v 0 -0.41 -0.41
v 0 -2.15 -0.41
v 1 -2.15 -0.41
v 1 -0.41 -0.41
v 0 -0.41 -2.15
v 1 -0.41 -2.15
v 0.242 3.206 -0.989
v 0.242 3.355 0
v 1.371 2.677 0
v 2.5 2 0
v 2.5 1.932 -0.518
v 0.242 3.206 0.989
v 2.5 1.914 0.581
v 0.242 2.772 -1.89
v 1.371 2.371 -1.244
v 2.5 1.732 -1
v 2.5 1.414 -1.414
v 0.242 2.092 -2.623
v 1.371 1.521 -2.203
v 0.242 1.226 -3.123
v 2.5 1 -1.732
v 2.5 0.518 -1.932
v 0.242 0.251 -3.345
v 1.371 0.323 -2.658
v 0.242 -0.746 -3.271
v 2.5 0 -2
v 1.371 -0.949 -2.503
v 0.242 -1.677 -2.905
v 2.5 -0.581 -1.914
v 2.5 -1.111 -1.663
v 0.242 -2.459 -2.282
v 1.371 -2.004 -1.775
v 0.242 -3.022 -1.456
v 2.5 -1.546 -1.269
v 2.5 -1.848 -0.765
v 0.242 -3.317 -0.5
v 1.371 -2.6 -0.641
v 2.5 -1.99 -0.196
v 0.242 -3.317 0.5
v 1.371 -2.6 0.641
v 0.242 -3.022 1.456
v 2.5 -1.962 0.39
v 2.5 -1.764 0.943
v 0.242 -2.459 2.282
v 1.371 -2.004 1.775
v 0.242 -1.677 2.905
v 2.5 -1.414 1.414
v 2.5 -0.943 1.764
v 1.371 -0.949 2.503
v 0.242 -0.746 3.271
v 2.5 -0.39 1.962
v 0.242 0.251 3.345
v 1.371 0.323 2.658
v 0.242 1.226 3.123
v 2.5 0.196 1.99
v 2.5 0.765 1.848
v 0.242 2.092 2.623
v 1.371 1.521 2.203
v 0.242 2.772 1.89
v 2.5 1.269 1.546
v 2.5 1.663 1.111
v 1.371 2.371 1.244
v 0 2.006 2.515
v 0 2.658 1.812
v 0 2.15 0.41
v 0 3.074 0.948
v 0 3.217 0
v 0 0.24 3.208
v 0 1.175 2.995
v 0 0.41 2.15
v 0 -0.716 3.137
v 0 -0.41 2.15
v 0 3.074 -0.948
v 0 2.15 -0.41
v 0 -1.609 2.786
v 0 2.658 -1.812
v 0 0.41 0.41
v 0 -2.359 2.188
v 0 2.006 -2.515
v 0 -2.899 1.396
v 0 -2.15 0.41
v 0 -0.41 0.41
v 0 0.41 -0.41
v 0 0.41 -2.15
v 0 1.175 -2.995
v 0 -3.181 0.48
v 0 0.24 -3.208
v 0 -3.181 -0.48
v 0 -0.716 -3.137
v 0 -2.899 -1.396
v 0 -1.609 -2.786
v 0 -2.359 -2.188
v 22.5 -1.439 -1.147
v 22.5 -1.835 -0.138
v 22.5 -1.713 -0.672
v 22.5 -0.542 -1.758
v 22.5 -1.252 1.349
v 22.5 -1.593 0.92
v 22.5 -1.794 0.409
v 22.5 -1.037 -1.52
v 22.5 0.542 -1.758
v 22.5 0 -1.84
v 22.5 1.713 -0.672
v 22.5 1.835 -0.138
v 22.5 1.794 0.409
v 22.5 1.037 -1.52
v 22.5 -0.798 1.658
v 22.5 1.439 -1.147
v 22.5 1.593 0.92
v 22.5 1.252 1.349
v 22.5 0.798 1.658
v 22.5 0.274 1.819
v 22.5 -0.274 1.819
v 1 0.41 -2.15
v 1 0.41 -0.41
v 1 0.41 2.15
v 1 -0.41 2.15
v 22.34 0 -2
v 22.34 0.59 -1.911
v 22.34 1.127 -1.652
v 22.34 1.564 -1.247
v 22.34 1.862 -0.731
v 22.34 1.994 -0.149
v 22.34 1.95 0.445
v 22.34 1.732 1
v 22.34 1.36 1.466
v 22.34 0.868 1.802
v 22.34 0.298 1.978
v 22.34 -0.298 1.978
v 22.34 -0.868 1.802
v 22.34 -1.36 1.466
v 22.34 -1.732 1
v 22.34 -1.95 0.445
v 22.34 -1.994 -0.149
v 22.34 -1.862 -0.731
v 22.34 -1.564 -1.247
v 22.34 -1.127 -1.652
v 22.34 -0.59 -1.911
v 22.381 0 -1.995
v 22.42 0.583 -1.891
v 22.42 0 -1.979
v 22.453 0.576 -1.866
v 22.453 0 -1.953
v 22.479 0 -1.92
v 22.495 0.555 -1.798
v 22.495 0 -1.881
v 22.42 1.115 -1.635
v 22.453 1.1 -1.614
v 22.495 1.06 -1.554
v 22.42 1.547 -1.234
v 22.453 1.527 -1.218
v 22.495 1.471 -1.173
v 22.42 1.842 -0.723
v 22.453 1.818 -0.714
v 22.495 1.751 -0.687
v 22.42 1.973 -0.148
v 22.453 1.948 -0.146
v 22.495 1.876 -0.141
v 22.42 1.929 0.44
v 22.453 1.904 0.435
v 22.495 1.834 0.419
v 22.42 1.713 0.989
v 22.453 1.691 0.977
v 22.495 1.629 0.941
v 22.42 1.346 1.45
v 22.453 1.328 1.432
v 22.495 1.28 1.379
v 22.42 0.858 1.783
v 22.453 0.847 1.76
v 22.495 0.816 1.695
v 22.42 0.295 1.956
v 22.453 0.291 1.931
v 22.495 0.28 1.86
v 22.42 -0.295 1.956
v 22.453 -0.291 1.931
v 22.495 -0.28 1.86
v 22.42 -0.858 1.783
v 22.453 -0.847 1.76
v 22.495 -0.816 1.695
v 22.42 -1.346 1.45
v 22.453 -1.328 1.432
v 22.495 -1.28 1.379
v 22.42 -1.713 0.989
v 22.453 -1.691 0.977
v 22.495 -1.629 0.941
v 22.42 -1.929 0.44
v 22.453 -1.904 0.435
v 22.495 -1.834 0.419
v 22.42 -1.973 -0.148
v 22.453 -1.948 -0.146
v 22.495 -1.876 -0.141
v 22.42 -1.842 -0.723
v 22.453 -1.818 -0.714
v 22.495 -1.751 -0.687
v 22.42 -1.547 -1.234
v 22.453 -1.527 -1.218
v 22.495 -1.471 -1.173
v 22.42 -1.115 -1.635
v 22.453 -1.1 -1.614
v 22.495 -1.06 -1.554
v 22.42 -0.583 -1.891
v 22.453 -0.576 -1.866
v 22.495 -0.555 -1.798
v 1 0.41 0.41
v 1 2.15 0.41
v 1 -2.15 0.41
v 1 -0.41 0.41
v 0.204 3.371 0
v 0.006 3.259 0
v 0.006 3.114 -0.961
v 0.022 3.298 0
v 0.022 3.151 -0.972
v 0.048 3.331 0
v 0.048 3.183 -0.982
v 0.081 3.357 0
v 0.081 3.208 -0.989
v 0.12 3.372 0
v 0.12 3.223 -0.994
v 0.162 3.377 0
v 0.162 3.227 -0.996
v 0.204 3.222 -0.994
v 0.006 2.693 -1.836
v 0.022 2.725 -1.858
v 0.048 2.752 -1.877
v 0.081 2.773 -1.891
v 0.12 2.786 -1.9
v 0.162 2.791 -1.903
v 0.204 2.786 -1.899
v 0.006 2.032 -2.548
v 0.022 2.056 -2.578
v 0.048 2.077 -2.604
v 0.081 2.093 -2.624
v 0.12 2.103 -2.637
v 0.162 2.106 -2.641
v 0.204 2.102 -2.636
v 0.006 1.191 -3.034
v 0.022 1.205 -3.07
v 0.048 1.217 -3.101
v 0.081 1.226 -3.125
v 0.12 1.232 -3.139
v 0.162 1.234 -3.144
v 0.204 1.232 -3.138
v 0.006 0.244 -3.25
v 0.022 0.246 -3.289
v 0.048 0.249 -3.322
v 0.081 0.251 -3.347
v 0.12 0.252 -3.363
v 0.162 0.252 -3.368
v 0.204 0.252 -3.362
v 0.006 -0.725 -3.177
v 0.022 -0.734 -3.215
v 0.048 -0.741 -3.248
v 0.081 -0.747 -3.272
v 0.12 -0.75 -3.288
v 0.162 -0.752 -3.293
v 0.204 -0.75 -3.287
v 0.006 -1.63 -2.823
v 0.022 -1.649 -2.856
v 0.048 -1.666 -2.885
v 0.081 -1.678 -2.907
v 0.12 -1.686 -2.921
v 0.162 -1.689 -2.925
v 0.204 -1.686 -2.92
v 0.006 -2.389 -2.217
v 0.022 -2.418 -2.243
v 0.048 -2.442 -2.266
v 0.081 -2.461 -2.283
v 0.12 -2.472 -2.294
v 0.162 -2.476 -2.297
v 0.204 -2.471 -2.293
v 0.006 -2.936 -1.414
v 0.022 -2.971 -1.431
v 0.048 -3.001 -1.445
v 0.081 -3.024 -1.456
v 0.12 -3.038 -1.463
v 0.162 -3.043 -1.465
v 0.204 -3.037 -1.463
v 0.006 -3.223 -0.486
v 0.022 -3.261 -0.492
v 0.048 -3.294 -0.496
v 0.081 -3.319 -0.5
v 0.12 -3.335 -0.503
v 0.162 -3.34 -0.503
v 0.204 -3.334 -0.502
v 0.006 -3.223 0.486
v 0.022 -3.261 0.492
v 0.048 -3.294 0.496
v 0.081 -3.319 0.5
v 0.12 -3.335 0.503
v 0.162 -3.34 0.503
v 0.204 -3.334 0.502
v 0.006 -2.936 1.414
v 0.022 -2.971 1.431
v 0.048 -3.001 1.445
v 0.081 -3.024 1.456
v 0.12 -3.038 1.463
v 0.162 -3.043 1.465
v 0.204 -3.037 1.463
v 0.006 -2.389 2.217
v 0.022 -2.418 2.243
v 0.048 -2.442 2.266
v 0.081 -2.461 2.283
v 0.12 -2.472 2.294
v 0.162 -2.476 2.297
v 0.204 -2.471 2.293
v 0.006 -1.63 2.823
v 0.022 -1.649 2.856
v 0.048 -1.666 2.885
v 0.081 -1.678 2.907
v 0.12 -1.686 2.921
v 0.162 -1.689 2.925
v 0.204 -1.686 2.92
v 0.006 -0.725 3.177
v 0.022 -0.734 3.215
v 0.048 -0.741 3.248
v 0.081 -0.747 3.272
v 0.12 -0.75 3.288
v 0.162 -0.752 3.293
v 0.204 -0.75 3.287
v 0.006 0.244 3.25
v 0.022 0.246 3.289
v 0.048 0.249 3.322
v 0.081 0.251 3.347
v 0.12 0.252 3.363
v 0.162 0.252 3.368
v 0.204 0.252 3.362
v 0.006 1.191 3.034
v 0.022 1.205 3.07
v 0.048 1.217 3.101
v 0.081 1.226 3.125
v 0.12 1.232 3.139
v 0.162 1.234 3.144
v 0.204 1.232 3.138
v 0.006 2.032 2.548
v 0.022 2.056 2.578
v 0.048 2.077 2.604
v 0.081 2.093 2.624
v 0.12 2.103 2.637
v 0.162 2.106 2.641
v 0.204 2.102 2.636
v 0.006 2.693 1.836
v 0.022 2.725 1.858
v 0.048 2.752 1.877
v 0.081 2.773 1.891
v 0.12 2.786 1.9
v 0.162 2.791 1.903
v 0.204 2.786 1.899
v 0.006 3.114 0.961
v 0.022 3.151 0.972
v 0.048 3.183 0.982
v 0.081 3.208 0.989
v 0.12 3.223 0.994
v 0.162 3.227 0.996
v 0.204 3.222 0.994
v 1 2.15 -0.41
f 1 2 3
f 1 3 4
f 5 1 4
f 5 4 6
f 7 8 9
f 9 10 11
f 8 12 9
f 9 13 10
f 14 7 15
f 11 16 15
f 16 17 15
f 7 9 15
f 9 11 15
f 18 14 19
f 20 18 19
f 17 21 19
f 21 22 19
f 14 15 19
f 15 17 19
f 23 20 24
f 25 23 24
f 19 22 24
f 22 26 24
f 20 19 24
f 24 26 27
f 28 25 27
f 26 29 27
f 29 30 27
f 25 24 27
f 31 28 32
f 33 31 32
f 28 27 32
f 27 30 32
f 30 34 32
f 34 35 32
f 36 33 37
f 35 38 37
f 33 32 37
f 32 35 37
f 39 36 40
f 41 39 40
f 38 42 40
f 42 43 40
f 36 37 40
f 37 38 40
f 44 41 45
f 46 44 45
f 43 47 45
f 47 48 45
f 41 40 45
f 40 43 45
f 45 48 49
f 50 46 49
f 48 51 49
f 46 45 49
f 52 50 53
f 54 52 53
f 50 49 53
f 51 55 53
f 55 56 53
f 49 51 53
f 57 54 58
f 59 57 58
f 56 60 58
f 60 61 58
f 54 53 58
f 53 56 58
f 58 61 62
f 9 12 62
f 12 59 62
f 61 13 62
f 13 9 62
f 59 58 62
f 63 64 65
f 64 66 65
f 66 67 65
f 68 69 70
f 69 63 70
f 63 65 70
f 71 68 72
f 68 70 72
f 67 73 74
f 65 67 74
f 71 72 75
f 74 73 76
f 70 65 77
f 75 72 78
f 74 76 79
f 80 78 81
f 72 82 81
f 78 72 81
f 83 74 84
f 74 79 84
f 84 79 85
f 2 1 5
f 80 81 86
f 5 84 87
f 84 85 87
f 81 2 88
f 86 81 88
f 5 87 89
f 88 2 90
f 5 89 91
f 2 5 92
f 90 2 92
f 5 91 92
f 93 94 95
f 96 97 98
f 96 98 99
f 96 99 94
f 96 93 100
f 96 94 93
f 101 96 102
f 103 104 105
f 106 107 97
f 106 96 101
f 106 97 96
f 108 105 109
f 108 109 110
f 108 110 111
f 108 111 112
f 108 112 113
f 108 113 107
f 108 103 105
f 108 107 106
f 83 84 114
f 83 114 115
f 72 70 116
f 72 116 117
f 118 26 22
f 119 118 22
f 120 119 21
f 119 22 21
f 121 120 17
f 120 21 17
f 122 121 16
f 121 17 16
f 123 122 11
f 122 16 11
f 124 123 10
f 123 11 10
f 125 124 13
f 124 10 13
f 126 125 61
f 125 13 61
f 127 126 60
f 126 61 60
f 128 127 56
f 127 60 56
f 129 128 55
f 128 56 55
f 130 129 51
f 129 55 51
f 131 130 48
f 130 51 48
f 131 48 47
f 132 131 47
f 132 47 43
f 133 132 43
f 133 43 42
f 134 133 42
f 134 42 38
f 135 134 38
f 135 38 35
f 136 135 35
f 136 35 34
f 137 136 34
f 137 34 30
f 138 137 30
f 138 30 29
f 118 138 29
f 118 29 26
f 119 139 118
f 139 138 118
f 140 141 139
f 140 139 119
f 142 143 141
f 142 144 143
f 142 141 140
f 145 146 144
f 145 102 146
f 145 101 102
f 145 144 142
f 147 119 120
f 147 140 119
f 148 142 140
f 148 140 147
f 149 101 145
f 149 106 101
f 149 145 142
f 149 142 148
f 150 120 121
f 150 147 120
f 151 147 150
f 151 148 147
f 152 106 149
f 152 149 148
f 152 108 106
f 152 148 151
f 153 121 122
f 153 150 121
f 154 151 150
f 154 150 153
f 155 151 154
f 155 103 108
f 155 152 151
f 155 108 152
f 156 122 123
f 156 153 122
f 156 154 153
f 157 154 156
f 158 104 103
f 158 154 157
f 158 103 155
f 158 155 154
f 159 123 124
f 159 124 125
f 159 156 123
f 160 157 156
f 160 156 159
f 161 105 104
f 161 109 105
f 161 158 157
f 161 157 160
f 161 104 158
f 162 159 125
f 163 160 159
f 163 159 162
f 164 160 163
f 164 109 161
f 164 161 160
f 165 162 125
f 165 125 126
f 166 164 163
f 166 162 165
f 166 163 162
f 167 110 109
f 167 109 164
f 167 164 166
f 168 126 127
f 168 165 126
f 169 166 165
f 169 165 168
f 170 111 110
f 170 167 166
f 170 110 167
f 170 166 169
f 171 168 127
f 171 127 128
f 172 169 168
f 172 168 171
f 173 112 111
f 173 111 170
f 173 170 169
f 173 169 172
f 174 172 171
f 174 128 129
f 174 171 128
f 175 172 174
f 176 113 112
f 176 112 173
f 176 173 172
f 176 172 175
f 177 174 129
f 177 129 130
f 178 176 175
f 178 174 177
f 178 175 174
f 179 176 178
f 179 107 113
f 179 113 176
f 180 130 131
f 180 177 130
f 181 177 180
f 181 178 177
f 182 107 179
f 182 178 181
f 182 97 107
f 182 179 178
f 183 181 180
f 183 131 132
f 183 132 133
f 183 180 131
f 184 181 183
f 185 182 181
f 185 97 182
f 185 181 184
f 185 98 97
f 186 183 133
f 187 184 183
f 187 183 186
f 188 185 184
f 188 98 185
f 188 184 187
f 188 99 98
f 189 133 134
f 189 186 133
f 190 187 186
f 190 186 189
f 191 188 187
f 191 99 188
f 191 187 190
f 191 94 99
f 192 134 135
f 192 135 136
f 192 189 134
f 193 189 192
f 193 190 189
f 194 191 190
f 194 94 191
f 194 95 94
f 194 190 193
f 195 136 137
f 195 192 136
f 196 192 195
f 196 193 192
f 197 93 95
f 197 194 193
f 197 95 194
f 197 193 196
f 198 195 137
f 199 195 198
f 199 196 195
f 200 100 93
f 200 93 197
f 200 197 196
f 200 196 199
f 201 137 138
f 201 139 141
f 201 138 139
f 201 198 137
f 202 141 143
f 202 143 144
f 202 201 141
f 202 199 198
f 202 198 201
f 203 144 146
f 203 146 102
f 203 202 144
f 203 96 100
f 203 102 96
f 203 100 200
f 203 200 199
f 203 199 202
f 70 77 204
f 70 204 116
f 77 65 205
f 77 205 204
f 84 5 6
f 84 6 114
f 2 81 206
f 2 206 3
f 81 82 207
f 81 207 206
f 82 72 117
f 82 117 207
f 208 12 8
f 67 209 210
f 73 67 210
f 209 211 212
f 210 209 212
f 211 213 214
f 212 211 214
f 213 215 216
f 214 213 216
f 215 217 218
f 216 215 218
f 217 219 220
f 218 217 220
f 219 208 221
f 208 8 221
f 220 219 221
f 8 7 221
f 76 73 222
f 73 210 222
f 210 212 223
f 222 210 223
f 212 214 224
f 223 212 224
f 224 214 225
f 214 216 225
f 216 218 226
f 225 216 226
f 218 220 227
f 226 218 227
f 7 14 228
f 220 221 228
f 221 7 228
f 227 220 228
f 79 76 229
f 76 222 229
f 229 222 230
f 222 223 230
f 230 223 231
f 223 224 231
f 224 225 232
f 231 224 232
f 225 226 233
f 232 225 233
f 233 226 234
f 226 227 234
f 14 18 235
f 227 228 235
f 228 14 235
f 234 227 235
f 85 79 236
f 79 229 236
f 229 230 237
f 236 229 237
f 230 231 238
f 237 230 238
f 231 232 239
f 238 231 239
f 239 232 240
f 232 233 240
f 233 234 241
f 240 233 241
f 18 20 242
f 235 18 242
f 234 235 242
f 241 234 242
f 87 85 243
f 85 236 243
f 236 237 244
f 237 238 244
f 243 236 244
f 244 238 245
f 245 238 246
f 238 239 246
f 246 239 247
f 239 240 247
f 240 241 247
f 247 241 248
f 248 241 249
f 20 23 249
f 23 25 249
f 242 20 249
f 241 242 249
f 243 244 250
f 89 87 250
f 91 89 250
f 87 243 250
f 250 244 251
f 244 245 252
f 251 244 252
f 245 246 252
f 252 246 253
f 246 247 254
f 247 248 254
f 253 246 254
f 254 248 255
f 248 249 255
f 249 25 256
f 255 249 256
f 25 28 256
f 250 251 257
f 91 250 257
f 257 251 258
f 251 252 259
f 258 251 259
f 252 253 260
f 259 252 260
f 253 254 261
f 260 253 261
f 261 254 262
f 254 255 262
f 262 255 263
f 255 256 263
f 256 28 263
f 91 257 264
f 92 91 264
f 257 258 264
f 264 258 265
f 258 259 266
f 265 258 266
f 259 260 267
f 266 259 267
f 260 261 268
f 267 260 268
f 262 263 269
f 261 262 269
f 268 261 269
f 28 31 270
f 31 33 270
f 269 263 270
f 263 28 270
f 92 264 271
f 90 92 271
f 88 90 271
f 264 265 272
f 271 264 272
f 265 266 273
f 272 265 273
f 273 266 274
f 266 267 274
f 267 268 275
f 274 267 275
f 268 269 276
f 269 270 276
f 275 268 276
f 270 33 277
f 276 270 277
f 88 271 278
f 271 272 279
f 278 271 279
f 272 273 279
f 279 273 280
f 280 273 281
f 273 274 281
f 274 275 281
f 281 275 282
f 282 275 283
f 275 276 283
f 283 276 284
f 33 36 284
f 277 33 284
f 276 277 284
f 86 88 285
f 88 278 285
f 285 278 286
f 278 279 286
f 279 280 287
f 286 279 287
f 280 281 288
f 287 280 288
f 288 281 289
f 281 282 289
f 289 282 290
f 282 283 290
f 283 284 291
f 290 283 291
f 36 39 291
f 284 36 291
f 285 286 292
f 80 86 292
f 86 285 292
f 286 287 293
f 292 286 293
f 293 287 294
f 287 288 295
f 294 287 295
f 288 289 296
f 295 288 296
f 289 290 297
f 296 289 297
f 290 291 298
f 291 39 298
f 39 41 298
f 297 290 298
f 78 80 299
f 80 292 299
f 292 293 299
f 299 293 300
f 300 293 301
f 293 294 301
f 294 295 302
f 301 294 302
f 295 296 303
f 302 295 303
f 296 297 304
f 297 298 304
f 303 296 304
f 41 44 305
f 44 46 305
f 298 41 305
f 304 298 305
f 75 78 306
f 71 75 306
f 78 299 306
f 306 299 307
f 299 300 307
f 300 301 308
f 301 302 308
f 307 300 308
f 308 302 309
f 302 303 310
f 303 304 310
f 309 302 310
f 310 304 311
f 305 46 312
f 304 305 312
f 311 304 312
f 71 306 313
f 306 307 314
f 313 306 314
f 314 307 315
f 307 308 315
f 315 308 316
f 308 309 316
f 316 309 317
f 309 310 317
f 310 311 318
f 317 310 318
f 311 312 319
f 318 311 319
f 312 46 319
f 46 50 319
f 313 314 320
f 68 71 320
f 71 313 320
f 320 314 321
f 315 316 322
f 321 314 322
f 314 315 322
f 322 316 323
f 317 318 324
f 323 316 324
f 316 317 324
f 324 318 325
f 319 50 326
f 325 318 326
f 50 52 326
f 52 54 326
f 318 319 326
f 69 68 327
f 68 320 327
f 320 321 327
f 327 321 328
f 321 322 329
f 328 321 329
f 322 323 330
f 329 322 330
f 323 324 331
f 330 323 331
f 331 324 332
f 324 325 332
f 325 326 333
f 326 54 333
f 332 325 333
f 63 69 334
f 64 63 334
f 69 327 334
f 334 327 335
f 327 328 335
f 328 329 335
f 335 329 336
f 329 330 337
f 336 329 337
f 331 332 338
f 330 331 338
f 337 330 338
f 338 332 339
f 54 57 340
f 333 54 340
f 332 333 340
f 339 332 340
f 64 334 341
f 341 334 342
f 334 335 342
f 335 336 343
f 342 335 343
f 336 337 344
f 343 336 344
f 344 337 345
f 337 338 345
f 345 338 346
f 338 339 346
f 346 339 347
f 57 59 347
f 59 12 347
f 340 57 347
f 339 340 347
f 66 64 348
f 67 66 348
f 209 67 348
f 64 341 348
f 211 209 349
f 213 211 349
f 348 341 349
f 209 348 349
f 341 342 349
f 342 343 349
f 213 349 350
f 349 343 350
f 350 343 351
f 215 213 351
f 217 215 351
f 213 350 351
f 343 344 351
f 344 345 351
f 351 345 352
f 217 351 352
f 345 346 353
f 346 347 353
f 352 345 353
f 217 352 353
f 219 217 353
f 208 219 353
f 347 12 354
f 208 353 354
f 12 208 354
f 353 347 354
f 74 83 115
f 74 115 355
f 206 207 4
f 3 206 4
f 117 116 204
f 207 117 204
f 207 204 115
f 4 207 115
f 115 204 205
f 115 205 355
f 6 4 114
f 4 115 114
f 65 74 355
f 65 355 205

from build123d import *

# Parameters (mm, degrees)
FILLET_1_R          = 0.16
SKETCH_2_R          = 2
EXTRUDE_1_DEPTH     = 20
FILLET_2_R          = 0.16
CUT_EXTRUDE_1_DEPTH = 1


with BuildPart() as part:
    # 草图1 → 旋转1 (revolve)
    with BuildSketch(Plane.XY):
        Polygon((0, 0), (0, 3.5), (2.5, 2), (2.5, 0), align=None)
    revolve(axis=Axis((0, 0, 0), (-1, 0, 0)))

    # 圆角1
    fillet_1_edges = [part.edges().sort_by_distance(p)[0] for p in [
        (0, -3.5, 0),
    ]]
    fillet(fillet_1_edges, radius=FILLET_1_R)

    # 草图2 → 凸台-拉伸1 (add)
    with BuildSketch(Plane(origin=(2.5, 0, 0), x_dir=(0, 0, -1), z_dir=(1, 0, 0))):
        Circle(SKETCH_2_R)
    extrude(amount=EXTRUDE_1_DEPTH)

    # 圆角2
    fillet_2_edges = [part.edges().sort_by_distance(p)[0] for p in [
        (22.5, 0, 2),
    ]]
    fillet(fillet_2_edges, radius=FILLET_2_R)

    # 草图3 → 切除-拉伸1 (cut)
    with BuildSketch(Plane.ZY):
        Polygon((0.41, -0.41), (0.41, -2.15), (-0.41, -2.15), (-0.41, -0.41), (-2.15, -0.41), (-2.15, 0.41), (-0.41, 0.41), (-0.41, 2.15), (0.41, 2.15), (0.41, 0.41), (2.15, 0.41), (2.15, -0.41), align=None)
    extrude(amount=-CUT_EXTRUDE_1_DEPTH, mode=Mode.SUBTRACT)


solid = part.part
